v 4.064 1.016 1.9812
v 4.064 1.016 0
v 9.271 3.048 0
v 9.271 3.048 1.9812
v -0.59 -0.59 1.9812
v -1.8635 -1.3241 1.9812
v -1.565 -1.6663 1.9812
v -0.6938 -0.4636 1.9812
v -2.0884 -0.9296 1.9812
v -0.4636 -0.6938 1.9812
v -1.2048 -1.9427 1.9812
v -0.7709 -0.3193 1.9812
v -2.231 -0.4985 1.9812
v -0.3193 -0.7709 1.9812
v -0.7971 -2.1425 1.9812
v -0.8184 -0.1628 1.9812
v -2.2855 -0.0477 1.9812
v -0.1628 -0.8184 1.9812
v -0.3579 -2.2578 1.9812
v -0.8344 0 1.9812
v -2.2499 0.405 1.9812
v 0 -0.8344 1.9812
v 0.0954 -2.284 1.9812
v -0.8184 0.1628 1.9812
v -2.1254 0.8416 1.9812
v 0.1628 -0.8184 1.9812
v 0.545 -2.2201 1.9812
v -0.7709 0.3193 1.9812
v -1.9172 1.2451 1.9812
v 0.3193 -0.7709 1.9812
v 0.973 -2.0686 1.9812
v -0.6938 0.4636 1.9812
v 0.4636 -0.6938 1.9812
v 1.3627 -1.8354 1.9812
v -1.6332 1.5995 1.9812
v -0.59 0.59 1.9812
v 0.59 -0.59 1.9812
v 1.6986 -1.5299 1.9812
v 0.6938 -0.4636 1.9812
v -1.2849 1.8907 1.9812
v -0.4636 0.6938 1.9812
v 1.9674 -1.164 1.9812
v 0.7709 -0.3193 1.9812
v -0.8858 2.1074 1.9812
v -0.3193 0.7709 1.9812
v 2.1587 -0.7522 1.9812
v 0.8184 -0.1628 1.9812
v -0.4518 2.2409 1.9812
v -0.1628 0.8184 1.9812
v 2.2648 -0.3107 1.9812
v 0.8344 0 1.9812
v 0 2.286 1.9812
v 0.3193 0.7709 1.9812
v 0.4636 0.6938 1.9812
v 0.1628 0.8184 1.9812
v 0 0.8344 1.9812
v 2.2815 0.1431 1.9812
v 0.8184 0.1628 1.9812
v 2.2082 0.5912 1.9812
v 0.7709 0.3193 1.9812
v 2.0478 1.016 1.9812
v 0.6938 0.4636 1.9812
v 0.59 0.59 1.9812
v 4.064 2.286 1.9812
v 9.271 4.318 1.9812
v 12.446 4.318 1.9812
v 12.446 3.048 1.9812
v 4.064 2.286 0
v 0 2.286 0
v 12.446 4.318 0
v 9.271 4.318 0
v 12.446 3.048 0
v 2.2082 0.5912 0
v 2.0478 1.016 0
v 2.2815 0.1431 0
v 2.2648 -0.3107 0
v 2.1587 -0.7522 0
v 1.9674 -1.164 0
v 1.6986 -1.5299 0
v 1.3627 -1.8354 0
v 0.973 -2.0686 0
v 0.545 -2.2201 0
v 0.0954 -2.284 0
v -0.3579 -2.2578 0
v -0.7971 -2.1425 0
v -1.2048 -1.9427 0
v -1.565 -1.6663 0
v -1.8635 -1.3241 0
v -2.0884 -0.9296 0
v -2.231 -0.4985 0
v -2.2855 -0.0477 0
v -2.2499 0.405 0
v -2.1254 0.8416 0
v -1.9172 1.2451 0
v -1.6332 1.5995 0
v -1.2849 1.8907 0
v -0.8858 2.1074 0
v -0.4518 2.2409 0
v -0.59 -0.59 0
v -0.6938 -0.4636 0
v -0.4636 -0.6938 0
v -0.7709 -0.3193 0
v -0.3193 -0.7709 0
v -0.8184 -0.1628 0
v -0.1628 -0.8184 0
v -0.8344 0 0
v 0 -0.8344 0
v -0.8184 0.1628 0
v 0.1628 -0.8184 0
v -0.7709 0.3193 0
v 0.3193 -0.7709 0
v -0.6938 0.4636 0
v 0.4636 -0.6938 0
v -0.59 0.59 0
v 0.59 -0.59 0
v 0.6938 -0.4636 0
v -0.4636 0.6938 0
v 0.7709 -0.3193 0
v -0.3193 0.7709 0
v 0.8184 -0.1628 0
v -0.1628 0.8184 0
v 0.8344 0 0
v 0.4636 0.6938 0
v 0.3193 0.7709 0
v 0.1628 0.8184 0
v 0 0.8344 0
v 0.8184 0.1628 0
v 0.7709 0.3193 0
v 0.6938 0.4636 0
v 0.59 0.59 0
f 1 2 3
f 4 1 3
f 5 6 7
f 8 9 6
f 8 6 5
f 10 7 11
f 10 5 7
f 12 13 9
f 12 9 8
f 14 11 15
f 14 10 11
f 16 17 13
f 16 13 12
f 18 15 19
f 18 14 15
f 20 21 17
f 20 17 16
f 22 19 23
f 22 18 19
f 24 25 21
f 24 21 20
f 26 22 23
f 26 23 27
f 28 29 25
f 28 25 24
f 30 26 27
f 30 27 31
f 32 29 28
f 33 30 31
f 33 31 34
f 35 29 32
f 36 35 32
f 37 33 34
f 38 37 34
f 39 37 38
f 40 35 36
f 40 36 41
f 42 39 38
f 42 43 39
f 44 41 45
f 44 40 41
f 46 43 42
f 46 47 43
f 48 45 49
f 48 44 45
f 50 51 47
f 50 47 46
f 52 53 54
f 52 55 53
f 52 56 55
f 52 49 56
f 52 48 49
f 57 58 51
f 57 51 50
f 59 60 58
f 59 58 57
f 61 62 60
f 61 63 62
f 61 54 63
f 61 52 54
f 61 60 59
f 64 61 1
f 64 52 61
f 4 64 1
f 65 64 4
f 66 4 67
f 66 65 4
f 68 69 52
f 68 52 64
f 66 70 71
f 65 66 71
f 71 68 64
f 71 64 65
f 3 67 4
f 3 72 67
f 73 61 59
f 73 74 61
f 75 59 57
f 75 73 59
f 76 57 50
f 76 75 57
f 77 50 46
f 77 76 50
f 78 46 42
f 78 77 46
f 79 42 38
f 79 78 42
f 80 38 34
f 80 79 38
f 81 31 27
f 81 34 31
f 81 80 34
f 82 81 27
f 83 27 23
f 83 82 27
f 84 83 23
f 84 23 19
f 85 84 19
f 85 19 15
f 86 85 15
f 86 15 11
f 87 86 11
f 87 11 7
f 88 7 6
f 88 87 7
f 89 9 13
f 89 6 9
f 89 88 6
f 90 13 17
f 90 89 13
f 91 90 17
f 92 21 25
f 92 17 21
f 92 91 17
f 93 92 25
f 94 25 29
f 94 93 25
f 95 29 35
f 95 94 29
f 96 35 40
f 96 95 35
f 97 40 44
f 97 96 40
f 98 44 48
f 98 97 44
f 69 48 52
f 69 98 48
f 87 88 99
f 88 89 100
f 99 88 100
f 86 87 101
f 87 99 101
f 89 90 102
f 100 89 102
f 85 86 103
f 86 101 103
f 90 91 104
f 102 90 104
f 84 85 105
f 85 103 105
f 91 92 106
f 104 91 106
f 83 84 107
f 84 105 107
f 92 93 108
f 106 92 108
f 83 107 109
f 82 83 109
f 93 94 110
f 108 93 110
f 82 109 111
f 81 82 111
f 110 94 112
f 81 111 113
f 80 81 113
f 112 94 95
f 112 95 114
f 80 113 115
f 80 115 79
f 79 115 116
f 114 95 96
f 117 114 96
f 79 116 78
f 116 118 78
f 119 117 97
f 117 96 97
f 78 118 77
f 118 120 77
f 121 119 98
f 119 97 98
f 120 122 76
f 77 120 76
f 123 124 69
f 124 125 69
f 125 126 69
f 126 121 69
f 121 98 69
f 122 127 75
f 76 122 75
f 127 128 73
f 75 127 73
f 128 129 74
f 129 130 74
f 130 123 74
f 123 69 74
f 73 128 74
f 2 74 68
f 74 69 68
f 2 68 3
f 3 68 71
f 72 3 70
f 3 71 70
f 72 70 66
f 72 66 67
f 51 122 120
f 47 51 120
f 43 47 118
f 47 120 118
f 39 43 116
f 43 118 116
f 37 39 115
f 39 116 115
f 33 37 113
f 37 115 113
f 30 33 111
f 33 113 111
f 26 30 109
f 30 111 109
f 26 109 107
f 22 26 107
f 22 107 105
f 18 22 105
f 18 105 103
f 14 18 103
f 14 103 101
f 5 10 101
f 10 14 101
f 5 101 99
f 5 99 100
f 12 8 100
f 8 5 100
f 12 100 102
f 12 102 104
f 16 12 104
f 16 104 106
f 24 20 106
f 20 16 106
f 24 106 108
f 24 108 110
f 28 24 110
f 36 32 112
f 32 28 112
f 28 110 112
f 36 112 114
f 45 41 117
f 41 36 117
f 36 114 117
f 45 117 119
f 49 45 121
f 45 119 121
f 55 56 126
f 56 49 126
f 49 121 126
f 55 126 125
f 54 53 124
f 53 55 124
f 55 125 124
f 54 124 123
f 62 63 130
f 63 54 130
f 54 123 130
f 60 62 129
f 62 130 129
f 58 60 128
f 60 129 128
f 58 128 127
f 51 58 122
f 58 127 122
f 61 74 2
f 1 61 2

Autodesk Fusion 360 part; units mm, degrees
sketch "Sketch1" plane through (0, 0, 0) normal (0, 0, 1) x (1, 0, 0)
  circle A0 centre (0, 0) radius 0.8344
  line L0 (0, 0) -> (-2.286, 0) construction
  line L1 (0, 2.286) -> (4.064, 2.286)
  line L2 (2.0478, 1.016) -> (4.064, 1.016)
  line L3 (12.446, 4.318) -> (9.271, 4.318)
  line L4 (12.446, 4.318) -> (12.446, 3.048)
  line L5 (12.446, 3.048) -> (9.271, 3.048)
  line L6 (4.064, 2.286) -> (9.271, 4.318)
  line L7 (4.064, 1.016) -> (9.271, 3.048)
  arc A1 (0, 2.286) -> (2.0478, 1.016) centre (0, 0) ccw
  dimension "d1" = 1.6688
  dimension "d2" = 4.572
  dimension "d9" = 3.175
  dimension "d10" = 1.27
  dimension "d11" = 3.175
extrude "Extrude1" add sketch "Sketch1" along normal blind 1.9812
